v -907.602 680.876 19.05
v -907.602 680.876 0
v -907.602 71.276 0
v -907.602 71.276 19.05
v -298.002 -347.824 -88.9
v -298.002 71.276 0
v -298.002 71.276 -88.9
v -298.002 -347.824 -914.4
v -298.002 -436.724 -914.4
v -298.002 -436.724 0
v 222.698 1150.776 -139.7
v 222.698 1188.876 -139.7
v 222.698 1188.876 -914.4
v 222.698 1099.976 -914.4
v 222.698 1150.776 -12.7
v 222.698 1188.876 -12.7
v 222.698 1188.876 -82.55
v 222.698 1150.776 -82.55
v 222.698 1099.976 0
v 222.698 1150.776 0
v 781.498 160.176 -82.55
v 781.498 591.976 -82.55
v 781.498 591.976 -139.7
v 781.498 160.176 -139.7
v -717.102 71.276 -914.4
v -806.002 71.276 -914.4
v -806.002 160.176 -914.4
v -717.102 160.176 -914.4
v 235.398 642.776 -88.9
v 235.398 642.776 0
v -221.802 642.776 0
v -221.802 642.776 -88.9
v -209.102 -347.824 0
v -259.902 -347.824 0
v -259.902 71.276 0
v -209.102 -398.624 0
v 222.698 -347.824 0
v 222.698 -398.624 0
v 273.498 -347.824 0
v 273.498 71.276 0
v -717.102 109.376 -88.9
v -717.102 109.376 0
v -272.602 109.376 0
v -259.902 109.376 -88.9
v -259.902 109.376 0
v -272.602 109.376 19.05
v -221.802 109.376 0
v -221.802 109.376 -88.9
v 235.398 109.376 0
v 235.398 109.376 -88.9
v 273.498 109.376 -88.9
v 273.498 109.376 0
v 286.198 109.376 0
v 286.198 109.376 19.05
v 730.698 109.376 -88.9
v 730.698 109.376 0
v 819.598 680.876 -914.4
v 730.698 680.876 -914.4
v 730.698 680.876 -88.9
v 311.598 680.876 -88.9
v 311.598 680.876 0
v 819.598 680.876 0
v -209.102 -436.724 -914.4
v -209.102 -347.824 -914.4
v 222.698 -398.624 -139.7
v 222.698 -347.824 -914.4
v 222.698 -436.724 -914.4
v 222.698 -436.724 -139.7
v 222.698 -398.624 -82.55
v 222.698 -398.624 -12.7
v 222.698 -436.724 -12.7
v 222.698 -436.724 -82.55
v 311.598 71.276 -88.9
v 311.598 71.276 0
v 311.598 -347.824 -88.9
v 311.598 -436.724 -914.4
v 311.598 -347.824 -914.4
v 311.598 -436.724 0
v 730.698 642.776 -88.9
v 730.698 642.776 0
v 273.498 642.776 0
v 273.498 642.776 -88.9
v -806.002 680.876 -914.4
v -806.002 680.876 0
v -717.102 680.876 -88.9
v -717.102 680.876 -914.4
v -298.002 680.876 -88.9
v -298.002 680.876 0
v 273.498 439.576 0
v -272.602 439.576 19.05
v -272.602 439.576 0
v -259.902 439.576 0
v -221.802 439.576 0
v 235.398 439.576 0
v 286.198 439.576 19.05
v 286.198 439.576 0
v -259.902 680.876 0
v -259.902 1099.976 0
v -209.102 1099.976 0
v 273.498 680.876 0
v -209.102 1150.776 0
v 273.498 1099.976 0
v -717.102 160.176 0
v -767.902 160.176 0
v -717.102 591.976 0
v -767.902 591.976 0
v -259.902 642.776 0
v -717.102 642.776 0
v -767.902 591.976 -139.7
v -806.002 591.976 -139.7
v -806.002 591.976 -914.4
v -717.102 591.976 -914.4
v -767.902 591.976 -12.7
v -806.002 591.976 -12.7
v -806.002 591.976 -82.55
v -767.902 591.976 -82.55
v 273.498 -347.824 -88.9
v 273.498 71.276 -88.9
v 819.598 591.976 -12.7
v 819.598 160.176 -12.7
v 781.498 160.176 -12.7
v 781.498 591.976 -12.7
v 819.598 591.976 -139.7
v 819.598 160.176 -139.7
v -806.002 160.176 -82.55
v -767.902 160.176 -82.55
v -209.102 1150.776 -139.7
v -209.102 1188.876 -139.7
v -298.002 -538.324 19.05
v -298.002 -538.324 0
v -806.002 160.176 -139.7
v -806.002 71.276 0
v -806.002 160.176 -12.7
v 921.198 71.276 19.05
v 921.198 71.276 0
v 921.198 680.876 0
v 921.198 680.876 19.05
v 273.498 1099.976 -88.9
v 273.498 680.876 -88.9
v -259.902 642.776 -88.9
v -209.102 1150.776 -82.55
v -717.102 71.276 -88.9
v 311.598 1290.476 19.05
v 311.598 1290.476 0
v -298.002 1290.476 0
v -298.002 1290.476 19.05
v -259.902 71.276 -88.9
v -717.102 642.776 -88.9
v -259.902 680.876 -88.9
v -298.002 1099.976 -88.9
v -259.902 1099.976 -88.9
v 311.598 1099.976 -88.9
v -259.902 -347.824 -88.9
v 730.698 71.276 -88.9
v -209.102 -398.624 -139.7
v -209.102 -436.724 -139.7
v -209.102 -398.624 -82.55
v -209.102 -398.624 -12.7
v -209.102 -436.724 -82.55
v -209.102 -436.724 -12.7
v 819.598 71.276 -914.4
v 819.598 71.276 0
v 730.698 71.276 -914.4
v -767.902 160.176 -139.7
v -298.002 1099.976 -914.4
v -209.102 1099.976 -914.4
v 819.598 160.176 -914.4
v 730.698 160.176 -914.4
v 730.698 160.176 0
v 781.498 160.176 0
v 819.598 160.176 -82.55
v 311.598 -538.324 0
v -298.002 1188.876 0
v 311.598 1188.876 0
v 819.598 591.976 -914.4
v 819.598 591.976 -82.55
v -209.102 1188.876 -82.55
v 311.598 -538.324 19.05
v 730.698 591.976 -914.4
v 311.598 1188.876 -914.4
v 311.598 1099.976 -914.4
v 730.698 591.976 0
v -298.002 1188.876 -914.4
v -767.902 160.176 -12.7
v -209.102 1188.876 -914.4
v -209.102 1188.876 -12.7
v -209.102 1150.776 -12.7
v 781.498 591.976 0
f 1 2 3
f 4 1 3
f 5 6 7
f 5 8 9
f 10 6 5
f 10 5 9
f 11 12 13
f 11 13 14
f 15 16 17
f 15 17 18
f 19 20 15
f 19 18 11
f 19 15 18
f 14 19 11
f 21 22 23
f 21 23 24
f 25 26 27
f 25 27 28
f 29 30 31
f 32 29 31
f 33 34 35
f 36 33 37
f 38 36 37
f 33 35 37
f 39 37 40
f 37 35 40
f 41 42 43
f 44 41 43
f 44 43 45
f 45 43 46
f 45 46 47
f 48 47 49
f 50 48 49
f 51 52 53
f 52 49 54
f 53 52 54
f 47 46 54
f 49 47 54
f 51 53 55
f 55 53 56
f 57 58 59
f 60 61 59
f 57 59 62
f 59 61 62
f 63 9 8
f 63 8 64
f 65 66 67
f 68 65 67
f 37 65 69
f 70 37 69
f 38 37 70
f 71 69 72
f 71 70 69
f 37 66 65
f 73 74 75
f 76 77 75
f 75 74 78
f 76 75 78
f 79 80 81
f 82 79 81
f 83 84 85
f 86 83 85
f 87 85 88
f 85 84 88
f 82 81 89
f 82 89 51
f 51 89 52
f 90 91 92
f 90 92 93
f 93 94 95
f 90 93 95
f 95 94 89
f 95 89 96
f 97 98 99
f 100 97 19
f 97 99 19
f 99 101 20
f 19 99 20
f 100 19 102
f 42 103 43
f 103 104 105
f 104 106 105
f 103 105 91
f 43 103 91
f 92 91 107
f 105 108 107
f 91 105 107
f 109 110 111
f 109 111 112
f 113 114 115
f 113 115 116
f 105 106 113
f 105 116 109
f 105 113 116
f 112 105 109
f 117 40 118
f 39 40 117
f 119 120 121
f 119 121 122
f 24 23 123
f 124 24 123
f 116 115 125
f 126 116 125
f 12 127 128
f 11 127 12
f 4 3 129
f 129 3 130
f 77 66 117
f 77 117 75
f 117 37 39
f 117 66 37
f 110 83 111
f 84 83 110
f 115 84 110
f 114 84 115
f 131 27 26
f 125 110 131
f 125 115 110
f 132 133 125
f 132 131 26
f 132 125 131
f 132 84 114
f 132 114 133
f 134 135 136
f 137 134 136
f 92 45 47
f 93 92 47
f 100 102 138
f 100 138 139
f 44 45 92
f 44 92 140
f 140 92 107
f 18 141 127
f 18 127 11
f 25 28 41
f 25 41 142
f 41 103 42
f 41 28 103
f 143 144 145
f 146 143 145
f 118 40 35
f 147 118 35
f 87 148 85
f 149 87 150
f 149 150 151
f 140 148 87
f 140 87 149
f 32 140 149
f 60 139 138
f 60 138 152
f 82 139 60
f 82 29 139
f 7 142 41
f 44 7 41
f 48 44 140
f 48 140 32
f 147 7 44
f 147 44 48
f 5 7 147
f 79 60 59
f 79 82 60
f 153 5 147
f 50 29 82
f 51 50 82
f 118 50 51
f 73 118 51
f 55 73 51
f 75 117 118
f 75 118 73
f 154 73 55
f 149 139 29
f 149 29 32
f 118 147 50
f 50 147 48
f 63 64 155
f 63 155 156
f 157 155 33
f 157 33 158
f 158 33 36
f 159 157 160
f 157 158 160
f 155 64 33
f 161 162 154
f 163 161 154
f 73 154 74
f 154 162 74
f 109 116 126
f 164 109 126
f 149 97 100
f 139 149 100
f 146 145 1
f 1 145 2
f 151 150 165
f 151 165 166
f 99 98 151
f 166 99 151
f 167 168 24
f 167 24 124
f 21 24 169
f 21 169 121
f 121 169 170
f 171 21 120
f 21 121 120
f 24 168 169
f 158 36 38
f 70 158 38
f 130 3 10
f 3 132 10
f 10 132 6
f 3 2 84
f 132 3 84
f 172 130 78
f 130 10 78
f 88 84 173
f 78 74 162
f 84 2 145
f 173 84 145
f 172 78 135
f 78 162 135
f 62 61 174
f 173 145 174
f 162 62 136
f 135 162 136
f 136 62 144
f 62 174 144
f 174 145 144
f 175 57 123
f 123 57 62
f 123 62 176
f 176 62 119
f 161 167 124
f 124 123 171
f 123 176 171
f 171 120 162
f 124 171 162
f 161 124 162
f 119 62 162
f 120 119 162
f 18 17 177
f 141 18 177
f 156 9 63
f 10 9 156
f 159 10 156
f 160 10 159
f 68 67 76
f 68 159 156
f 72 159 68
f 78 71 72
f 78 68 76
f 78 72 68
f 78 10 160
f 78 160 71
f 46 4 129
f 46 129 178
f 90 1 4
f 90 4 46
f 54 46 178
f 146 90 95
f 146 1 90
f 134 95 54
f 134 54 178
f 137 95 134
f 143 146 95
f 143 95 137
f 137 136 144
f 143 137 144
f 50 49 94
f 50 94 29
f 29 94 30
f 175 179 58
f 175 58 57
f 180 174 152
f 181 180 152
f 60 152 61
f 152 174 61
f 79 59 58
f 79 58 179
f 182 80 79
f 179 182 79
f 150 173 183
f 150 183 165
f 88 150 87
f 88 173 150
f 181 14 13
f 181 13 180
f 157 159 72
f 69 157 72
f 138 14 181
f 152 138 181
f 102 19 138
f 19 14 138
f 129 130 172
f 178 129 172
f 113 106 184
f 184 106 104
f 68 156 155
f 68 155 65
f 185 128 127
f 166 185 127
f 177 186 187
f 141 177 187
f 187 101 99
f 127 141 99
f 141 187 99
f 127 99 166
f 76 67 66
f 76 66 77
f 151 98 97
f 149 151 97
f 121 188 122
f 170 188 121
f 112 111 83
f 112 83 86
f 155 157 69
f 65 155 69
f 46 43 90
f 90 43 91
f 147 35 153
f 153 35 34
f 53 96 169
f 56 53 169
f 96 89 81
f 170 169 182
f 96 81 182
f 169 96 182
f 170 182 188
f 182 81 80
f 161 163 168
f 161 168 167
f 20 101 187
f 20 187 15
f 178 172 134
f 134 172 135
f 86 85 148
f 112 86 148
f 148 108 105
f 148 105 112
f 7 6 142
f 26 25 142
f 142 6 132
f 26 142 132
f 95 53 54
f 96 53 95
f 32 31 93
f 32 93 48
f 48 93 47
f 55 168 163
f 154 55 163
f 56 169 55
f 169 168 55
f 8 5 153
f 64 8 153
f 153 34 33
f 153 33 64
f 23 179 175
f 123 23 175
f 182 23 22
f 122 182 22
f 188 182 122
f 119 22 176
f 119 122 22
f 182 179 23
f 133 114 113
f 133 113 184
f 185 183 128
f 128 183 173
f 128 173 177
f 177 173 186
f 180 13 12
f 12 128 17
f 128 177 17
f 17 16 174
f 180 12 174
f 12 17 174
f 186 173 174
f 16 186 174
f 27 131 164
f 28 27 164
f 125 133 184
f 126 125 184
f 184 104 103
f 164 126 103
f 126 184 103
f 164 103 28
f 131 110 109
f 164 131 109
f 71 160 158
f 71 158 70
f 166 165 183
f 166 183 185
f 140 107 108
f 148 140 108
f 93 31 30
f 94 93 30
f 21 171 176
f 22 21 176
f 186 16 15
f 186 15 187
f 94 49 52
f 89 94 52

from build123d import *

# Parameters (mm, degrees)
F0_W      = 558.8
F0_H      = 330.2
F1_DEPTH  = 19.05
F2_W      = 38.1
F2_H      = 419.1
F2_H_2    = 203.2
F2_H_3    = 330.2
F3_DEPTH  = 88.9
F4_W      = 88.9
F4_H      = 88.9
F5_DEPTH  = 914.4
F6_W      = 38.1
F6_H      = 431.8
F6_W_2    = 431.8
F6_H_2    = 38.1
F7_DEPTH  = 139.7
F8_W      = 431.8
F8_H      = 69.85
F9_DEPTH  = 78.74
F10_W     = 431.8
F10_H     = 69.85
F11_DEPTH = 66.04
F12_W     = 431.8
F12_H     = 69.85
F13_DEPTH = 53.34
F14_W     = 431.8
F14_H     = 69.85
F15_DEPTH = 76.2


with BuildPart() as f1:
    # F0 (on Top) → F1 (new body)
    with BuildSketch(Plane.XY):
        Polygon((-907.6019599199, 71.2758600712), (-298.0019599199, -538.3241399288), (311.5980400801, -538.3241399288), (921.1980400801, 71.2758600712), (921.1980400801, 680.8758600712), (311.5980400801, 1290.4758600712), (-298.0019599199, 1290.4758600712), (-907.6019599199, 680.8758600712), align=None)
        with Locations((6.7980400801, 274.4758600712)):
            Rectangle(F0_W, F0_H, mode=Mode.SUBTRACT)
    extrude(amount=F1_DEPTH)

    # F2 (on face) → F3 (join)
    with BuildSketch(Plane(origin=(0, 0, 0), x_dir=(1, 0, 0), z_dir=(0, 0, -1))):
        with Locations((-278.9519599199, -890.4258600712)):
            Rectangle(F2_W, F2_H)
        with Locations((292.5480400801, -890.4258600712)):
            Rectangle(F2_W, F2_H)
        Polygon((-717.1019599199, -642.7758600712), (-717.1019599199, -680.8758600712), (-298.0019599199, -680.8758600712), (-259.9019599199, -680.8758600712), (273.4980400801, -680.8758600712), (311.5980400801, -680.8758600712), (730.6980400801, -680.8758600712), (730.6980400801, -642.7758600712), (273.4980400801, -642.7758600712), (235.3980400801, -642.7758600712), (-221.8019599199, -642.7758600712), (-259.9019599199, -642.7758600712), align=None)
        with Locations((-240.8519599199, -541.1758600712)):
            Rectangle(F2_W, F2_H_2)
        Polygon((-298.0019599199, -71.2758600712), (-717.1019599199, -71.2758600712), (-717.1019599199, -109.3758600712), (-272.6019599199, -109.3758600712), (-259.9019599199, -109.3758600712), (-221.8019599199, -109.3758600712), (235.3980400801, -109.3758600712), (273.4980400801, -109.3758600712), (286.1980400801, -109.3758600712), (730.6980400801, -109.3758600712), (730.6980400801, -71.2758600712), (311.5980400801, -71.2758600712), (273.4980400801, -71.2758600712), (-259.9019599199, -71.2758600712), align=None)
        with Locations((-278.9519599199, 138.2741399288)):
            Rectangle(F2_W, F2_H)
        with Locations((292.5480400801, 138.2741399288)):
            Rectangle(F2_W, F2_H)
        with Locations((254.4480400801, -541.1758600712)):
            Rectangle(F2_W, F2_H_2)
        with Locations((-240.8519599199, -274.4758600712)):
            Rectangle(F2_W, F2_H_3)
        with Locations((254.4480400801, -274.4758600712)):
            Rectangle(F2_W, F2_H_3)
    extrude(amount=F3_DEPTH)

    # F4 (on face) → F5 (join)
    with BuildSketch(Plane(origin=(0, 0, 0), x_dir=(1, 0, 0), z_dir=(0, 0, -1))):
        with Locations((775.1480400801, -636.4258600712)):
            Rectangle(F4_W, F4_H)
        with Locations((775.1480400801, -115.7258600712)):
            Rectangle(F4_W, F4_H)
        with Locations((267.1480400801, -1144.4258600712)):
            Rectangle(F4_W, F4_H)
        with Locations((-761.5519599199, -636.4258600712)):
            Rectangle(F4_W, F4_H)
        with Locations((-253.5519599199, -1144.4258600712)):
            Rectangle(F4_W, F4_H)
        with Locations((267.1480400801, 392.2741399288)):
            Rectangle(F4_W, F4_H)
        with Locations((-253.5519599199, 392.2741399288)):
            Rectangle(F4_W, F4_H)
        with Locations((-761.5519599199, -115.7258600712)):
            Rectangle(F4_W, F4_H)
    extrude(amount=F5_DEPTH)

    # F6 (on face) → F7 (join)
    with BuildSketch(Plane(origin=(0, 0, 0), x_dir=(1, 0, 0), z_dir=(0, 0, -1))):
        with Locations((800.5480400801, -376.0758600712)):
            Rectangle(F6_W, F6_H)
        with Locations((-786.9519599199, -376.0758600712)):
            Rectangle(F6_W, F6_H)
        with Locations((6.7980400801, -1169.8258600712)):
            Rectangle(F6_W_2, F6_H_2)
        with Locations((6.7980400801, 417.6741399288)):
            Rectangle(F6_W_2, F6_H_2)
    extrude(amount=F7_DEPTH)

    # F8 (on face) → F9 (cut)
    with BuildSketch(Plane.XZ.offset(436.7241399288)):
        with Locations((6.7980400801, -47.625)):
            Rectangle(F8_W, F8_H)
    extrude(amount=-F9_DEPTH, mode=Mode.SUBTRACT)

    # F10 (on face) → F11 (cut)
    with BuildSketch(Plane(origin=(-806.0019599199, 0, 0), x_dir=(0, -1, 0), z_dir=(-1, 0, 0))):
        with Locations((-376.0758600712, -47.625)):
            Rectangle(F10_W, F10_H)
    extrude(amount=-F11_DEPTH, mode=Mode.SUBTRACT)

    # F12 (on face) → F13 (cut)
    with BuildSketch(Plane.YZ.offset(819.5980400801)):
        with Locations((376.0758600712, -47.625)):
            Rectangle(F12_W, F12_H)
    extrude(amount=-F13_DEPTH, mode=Mode.SUBTRACT)

    # F14 (on face) → F15 (cut)
    with BuildSketch(Plane(origin=(0, 1188.8758600712, 0), x_dir=(-1, 0, 0), z_dir=(0, 1, 0))):
        with Locations((-6.7980400801, -47.625)):
            Rectangle(F14_W, F14_H)
    extrude(amount=-F15_DEPTH, mode=Mode.SUBTRACT)


solid = f1.part
